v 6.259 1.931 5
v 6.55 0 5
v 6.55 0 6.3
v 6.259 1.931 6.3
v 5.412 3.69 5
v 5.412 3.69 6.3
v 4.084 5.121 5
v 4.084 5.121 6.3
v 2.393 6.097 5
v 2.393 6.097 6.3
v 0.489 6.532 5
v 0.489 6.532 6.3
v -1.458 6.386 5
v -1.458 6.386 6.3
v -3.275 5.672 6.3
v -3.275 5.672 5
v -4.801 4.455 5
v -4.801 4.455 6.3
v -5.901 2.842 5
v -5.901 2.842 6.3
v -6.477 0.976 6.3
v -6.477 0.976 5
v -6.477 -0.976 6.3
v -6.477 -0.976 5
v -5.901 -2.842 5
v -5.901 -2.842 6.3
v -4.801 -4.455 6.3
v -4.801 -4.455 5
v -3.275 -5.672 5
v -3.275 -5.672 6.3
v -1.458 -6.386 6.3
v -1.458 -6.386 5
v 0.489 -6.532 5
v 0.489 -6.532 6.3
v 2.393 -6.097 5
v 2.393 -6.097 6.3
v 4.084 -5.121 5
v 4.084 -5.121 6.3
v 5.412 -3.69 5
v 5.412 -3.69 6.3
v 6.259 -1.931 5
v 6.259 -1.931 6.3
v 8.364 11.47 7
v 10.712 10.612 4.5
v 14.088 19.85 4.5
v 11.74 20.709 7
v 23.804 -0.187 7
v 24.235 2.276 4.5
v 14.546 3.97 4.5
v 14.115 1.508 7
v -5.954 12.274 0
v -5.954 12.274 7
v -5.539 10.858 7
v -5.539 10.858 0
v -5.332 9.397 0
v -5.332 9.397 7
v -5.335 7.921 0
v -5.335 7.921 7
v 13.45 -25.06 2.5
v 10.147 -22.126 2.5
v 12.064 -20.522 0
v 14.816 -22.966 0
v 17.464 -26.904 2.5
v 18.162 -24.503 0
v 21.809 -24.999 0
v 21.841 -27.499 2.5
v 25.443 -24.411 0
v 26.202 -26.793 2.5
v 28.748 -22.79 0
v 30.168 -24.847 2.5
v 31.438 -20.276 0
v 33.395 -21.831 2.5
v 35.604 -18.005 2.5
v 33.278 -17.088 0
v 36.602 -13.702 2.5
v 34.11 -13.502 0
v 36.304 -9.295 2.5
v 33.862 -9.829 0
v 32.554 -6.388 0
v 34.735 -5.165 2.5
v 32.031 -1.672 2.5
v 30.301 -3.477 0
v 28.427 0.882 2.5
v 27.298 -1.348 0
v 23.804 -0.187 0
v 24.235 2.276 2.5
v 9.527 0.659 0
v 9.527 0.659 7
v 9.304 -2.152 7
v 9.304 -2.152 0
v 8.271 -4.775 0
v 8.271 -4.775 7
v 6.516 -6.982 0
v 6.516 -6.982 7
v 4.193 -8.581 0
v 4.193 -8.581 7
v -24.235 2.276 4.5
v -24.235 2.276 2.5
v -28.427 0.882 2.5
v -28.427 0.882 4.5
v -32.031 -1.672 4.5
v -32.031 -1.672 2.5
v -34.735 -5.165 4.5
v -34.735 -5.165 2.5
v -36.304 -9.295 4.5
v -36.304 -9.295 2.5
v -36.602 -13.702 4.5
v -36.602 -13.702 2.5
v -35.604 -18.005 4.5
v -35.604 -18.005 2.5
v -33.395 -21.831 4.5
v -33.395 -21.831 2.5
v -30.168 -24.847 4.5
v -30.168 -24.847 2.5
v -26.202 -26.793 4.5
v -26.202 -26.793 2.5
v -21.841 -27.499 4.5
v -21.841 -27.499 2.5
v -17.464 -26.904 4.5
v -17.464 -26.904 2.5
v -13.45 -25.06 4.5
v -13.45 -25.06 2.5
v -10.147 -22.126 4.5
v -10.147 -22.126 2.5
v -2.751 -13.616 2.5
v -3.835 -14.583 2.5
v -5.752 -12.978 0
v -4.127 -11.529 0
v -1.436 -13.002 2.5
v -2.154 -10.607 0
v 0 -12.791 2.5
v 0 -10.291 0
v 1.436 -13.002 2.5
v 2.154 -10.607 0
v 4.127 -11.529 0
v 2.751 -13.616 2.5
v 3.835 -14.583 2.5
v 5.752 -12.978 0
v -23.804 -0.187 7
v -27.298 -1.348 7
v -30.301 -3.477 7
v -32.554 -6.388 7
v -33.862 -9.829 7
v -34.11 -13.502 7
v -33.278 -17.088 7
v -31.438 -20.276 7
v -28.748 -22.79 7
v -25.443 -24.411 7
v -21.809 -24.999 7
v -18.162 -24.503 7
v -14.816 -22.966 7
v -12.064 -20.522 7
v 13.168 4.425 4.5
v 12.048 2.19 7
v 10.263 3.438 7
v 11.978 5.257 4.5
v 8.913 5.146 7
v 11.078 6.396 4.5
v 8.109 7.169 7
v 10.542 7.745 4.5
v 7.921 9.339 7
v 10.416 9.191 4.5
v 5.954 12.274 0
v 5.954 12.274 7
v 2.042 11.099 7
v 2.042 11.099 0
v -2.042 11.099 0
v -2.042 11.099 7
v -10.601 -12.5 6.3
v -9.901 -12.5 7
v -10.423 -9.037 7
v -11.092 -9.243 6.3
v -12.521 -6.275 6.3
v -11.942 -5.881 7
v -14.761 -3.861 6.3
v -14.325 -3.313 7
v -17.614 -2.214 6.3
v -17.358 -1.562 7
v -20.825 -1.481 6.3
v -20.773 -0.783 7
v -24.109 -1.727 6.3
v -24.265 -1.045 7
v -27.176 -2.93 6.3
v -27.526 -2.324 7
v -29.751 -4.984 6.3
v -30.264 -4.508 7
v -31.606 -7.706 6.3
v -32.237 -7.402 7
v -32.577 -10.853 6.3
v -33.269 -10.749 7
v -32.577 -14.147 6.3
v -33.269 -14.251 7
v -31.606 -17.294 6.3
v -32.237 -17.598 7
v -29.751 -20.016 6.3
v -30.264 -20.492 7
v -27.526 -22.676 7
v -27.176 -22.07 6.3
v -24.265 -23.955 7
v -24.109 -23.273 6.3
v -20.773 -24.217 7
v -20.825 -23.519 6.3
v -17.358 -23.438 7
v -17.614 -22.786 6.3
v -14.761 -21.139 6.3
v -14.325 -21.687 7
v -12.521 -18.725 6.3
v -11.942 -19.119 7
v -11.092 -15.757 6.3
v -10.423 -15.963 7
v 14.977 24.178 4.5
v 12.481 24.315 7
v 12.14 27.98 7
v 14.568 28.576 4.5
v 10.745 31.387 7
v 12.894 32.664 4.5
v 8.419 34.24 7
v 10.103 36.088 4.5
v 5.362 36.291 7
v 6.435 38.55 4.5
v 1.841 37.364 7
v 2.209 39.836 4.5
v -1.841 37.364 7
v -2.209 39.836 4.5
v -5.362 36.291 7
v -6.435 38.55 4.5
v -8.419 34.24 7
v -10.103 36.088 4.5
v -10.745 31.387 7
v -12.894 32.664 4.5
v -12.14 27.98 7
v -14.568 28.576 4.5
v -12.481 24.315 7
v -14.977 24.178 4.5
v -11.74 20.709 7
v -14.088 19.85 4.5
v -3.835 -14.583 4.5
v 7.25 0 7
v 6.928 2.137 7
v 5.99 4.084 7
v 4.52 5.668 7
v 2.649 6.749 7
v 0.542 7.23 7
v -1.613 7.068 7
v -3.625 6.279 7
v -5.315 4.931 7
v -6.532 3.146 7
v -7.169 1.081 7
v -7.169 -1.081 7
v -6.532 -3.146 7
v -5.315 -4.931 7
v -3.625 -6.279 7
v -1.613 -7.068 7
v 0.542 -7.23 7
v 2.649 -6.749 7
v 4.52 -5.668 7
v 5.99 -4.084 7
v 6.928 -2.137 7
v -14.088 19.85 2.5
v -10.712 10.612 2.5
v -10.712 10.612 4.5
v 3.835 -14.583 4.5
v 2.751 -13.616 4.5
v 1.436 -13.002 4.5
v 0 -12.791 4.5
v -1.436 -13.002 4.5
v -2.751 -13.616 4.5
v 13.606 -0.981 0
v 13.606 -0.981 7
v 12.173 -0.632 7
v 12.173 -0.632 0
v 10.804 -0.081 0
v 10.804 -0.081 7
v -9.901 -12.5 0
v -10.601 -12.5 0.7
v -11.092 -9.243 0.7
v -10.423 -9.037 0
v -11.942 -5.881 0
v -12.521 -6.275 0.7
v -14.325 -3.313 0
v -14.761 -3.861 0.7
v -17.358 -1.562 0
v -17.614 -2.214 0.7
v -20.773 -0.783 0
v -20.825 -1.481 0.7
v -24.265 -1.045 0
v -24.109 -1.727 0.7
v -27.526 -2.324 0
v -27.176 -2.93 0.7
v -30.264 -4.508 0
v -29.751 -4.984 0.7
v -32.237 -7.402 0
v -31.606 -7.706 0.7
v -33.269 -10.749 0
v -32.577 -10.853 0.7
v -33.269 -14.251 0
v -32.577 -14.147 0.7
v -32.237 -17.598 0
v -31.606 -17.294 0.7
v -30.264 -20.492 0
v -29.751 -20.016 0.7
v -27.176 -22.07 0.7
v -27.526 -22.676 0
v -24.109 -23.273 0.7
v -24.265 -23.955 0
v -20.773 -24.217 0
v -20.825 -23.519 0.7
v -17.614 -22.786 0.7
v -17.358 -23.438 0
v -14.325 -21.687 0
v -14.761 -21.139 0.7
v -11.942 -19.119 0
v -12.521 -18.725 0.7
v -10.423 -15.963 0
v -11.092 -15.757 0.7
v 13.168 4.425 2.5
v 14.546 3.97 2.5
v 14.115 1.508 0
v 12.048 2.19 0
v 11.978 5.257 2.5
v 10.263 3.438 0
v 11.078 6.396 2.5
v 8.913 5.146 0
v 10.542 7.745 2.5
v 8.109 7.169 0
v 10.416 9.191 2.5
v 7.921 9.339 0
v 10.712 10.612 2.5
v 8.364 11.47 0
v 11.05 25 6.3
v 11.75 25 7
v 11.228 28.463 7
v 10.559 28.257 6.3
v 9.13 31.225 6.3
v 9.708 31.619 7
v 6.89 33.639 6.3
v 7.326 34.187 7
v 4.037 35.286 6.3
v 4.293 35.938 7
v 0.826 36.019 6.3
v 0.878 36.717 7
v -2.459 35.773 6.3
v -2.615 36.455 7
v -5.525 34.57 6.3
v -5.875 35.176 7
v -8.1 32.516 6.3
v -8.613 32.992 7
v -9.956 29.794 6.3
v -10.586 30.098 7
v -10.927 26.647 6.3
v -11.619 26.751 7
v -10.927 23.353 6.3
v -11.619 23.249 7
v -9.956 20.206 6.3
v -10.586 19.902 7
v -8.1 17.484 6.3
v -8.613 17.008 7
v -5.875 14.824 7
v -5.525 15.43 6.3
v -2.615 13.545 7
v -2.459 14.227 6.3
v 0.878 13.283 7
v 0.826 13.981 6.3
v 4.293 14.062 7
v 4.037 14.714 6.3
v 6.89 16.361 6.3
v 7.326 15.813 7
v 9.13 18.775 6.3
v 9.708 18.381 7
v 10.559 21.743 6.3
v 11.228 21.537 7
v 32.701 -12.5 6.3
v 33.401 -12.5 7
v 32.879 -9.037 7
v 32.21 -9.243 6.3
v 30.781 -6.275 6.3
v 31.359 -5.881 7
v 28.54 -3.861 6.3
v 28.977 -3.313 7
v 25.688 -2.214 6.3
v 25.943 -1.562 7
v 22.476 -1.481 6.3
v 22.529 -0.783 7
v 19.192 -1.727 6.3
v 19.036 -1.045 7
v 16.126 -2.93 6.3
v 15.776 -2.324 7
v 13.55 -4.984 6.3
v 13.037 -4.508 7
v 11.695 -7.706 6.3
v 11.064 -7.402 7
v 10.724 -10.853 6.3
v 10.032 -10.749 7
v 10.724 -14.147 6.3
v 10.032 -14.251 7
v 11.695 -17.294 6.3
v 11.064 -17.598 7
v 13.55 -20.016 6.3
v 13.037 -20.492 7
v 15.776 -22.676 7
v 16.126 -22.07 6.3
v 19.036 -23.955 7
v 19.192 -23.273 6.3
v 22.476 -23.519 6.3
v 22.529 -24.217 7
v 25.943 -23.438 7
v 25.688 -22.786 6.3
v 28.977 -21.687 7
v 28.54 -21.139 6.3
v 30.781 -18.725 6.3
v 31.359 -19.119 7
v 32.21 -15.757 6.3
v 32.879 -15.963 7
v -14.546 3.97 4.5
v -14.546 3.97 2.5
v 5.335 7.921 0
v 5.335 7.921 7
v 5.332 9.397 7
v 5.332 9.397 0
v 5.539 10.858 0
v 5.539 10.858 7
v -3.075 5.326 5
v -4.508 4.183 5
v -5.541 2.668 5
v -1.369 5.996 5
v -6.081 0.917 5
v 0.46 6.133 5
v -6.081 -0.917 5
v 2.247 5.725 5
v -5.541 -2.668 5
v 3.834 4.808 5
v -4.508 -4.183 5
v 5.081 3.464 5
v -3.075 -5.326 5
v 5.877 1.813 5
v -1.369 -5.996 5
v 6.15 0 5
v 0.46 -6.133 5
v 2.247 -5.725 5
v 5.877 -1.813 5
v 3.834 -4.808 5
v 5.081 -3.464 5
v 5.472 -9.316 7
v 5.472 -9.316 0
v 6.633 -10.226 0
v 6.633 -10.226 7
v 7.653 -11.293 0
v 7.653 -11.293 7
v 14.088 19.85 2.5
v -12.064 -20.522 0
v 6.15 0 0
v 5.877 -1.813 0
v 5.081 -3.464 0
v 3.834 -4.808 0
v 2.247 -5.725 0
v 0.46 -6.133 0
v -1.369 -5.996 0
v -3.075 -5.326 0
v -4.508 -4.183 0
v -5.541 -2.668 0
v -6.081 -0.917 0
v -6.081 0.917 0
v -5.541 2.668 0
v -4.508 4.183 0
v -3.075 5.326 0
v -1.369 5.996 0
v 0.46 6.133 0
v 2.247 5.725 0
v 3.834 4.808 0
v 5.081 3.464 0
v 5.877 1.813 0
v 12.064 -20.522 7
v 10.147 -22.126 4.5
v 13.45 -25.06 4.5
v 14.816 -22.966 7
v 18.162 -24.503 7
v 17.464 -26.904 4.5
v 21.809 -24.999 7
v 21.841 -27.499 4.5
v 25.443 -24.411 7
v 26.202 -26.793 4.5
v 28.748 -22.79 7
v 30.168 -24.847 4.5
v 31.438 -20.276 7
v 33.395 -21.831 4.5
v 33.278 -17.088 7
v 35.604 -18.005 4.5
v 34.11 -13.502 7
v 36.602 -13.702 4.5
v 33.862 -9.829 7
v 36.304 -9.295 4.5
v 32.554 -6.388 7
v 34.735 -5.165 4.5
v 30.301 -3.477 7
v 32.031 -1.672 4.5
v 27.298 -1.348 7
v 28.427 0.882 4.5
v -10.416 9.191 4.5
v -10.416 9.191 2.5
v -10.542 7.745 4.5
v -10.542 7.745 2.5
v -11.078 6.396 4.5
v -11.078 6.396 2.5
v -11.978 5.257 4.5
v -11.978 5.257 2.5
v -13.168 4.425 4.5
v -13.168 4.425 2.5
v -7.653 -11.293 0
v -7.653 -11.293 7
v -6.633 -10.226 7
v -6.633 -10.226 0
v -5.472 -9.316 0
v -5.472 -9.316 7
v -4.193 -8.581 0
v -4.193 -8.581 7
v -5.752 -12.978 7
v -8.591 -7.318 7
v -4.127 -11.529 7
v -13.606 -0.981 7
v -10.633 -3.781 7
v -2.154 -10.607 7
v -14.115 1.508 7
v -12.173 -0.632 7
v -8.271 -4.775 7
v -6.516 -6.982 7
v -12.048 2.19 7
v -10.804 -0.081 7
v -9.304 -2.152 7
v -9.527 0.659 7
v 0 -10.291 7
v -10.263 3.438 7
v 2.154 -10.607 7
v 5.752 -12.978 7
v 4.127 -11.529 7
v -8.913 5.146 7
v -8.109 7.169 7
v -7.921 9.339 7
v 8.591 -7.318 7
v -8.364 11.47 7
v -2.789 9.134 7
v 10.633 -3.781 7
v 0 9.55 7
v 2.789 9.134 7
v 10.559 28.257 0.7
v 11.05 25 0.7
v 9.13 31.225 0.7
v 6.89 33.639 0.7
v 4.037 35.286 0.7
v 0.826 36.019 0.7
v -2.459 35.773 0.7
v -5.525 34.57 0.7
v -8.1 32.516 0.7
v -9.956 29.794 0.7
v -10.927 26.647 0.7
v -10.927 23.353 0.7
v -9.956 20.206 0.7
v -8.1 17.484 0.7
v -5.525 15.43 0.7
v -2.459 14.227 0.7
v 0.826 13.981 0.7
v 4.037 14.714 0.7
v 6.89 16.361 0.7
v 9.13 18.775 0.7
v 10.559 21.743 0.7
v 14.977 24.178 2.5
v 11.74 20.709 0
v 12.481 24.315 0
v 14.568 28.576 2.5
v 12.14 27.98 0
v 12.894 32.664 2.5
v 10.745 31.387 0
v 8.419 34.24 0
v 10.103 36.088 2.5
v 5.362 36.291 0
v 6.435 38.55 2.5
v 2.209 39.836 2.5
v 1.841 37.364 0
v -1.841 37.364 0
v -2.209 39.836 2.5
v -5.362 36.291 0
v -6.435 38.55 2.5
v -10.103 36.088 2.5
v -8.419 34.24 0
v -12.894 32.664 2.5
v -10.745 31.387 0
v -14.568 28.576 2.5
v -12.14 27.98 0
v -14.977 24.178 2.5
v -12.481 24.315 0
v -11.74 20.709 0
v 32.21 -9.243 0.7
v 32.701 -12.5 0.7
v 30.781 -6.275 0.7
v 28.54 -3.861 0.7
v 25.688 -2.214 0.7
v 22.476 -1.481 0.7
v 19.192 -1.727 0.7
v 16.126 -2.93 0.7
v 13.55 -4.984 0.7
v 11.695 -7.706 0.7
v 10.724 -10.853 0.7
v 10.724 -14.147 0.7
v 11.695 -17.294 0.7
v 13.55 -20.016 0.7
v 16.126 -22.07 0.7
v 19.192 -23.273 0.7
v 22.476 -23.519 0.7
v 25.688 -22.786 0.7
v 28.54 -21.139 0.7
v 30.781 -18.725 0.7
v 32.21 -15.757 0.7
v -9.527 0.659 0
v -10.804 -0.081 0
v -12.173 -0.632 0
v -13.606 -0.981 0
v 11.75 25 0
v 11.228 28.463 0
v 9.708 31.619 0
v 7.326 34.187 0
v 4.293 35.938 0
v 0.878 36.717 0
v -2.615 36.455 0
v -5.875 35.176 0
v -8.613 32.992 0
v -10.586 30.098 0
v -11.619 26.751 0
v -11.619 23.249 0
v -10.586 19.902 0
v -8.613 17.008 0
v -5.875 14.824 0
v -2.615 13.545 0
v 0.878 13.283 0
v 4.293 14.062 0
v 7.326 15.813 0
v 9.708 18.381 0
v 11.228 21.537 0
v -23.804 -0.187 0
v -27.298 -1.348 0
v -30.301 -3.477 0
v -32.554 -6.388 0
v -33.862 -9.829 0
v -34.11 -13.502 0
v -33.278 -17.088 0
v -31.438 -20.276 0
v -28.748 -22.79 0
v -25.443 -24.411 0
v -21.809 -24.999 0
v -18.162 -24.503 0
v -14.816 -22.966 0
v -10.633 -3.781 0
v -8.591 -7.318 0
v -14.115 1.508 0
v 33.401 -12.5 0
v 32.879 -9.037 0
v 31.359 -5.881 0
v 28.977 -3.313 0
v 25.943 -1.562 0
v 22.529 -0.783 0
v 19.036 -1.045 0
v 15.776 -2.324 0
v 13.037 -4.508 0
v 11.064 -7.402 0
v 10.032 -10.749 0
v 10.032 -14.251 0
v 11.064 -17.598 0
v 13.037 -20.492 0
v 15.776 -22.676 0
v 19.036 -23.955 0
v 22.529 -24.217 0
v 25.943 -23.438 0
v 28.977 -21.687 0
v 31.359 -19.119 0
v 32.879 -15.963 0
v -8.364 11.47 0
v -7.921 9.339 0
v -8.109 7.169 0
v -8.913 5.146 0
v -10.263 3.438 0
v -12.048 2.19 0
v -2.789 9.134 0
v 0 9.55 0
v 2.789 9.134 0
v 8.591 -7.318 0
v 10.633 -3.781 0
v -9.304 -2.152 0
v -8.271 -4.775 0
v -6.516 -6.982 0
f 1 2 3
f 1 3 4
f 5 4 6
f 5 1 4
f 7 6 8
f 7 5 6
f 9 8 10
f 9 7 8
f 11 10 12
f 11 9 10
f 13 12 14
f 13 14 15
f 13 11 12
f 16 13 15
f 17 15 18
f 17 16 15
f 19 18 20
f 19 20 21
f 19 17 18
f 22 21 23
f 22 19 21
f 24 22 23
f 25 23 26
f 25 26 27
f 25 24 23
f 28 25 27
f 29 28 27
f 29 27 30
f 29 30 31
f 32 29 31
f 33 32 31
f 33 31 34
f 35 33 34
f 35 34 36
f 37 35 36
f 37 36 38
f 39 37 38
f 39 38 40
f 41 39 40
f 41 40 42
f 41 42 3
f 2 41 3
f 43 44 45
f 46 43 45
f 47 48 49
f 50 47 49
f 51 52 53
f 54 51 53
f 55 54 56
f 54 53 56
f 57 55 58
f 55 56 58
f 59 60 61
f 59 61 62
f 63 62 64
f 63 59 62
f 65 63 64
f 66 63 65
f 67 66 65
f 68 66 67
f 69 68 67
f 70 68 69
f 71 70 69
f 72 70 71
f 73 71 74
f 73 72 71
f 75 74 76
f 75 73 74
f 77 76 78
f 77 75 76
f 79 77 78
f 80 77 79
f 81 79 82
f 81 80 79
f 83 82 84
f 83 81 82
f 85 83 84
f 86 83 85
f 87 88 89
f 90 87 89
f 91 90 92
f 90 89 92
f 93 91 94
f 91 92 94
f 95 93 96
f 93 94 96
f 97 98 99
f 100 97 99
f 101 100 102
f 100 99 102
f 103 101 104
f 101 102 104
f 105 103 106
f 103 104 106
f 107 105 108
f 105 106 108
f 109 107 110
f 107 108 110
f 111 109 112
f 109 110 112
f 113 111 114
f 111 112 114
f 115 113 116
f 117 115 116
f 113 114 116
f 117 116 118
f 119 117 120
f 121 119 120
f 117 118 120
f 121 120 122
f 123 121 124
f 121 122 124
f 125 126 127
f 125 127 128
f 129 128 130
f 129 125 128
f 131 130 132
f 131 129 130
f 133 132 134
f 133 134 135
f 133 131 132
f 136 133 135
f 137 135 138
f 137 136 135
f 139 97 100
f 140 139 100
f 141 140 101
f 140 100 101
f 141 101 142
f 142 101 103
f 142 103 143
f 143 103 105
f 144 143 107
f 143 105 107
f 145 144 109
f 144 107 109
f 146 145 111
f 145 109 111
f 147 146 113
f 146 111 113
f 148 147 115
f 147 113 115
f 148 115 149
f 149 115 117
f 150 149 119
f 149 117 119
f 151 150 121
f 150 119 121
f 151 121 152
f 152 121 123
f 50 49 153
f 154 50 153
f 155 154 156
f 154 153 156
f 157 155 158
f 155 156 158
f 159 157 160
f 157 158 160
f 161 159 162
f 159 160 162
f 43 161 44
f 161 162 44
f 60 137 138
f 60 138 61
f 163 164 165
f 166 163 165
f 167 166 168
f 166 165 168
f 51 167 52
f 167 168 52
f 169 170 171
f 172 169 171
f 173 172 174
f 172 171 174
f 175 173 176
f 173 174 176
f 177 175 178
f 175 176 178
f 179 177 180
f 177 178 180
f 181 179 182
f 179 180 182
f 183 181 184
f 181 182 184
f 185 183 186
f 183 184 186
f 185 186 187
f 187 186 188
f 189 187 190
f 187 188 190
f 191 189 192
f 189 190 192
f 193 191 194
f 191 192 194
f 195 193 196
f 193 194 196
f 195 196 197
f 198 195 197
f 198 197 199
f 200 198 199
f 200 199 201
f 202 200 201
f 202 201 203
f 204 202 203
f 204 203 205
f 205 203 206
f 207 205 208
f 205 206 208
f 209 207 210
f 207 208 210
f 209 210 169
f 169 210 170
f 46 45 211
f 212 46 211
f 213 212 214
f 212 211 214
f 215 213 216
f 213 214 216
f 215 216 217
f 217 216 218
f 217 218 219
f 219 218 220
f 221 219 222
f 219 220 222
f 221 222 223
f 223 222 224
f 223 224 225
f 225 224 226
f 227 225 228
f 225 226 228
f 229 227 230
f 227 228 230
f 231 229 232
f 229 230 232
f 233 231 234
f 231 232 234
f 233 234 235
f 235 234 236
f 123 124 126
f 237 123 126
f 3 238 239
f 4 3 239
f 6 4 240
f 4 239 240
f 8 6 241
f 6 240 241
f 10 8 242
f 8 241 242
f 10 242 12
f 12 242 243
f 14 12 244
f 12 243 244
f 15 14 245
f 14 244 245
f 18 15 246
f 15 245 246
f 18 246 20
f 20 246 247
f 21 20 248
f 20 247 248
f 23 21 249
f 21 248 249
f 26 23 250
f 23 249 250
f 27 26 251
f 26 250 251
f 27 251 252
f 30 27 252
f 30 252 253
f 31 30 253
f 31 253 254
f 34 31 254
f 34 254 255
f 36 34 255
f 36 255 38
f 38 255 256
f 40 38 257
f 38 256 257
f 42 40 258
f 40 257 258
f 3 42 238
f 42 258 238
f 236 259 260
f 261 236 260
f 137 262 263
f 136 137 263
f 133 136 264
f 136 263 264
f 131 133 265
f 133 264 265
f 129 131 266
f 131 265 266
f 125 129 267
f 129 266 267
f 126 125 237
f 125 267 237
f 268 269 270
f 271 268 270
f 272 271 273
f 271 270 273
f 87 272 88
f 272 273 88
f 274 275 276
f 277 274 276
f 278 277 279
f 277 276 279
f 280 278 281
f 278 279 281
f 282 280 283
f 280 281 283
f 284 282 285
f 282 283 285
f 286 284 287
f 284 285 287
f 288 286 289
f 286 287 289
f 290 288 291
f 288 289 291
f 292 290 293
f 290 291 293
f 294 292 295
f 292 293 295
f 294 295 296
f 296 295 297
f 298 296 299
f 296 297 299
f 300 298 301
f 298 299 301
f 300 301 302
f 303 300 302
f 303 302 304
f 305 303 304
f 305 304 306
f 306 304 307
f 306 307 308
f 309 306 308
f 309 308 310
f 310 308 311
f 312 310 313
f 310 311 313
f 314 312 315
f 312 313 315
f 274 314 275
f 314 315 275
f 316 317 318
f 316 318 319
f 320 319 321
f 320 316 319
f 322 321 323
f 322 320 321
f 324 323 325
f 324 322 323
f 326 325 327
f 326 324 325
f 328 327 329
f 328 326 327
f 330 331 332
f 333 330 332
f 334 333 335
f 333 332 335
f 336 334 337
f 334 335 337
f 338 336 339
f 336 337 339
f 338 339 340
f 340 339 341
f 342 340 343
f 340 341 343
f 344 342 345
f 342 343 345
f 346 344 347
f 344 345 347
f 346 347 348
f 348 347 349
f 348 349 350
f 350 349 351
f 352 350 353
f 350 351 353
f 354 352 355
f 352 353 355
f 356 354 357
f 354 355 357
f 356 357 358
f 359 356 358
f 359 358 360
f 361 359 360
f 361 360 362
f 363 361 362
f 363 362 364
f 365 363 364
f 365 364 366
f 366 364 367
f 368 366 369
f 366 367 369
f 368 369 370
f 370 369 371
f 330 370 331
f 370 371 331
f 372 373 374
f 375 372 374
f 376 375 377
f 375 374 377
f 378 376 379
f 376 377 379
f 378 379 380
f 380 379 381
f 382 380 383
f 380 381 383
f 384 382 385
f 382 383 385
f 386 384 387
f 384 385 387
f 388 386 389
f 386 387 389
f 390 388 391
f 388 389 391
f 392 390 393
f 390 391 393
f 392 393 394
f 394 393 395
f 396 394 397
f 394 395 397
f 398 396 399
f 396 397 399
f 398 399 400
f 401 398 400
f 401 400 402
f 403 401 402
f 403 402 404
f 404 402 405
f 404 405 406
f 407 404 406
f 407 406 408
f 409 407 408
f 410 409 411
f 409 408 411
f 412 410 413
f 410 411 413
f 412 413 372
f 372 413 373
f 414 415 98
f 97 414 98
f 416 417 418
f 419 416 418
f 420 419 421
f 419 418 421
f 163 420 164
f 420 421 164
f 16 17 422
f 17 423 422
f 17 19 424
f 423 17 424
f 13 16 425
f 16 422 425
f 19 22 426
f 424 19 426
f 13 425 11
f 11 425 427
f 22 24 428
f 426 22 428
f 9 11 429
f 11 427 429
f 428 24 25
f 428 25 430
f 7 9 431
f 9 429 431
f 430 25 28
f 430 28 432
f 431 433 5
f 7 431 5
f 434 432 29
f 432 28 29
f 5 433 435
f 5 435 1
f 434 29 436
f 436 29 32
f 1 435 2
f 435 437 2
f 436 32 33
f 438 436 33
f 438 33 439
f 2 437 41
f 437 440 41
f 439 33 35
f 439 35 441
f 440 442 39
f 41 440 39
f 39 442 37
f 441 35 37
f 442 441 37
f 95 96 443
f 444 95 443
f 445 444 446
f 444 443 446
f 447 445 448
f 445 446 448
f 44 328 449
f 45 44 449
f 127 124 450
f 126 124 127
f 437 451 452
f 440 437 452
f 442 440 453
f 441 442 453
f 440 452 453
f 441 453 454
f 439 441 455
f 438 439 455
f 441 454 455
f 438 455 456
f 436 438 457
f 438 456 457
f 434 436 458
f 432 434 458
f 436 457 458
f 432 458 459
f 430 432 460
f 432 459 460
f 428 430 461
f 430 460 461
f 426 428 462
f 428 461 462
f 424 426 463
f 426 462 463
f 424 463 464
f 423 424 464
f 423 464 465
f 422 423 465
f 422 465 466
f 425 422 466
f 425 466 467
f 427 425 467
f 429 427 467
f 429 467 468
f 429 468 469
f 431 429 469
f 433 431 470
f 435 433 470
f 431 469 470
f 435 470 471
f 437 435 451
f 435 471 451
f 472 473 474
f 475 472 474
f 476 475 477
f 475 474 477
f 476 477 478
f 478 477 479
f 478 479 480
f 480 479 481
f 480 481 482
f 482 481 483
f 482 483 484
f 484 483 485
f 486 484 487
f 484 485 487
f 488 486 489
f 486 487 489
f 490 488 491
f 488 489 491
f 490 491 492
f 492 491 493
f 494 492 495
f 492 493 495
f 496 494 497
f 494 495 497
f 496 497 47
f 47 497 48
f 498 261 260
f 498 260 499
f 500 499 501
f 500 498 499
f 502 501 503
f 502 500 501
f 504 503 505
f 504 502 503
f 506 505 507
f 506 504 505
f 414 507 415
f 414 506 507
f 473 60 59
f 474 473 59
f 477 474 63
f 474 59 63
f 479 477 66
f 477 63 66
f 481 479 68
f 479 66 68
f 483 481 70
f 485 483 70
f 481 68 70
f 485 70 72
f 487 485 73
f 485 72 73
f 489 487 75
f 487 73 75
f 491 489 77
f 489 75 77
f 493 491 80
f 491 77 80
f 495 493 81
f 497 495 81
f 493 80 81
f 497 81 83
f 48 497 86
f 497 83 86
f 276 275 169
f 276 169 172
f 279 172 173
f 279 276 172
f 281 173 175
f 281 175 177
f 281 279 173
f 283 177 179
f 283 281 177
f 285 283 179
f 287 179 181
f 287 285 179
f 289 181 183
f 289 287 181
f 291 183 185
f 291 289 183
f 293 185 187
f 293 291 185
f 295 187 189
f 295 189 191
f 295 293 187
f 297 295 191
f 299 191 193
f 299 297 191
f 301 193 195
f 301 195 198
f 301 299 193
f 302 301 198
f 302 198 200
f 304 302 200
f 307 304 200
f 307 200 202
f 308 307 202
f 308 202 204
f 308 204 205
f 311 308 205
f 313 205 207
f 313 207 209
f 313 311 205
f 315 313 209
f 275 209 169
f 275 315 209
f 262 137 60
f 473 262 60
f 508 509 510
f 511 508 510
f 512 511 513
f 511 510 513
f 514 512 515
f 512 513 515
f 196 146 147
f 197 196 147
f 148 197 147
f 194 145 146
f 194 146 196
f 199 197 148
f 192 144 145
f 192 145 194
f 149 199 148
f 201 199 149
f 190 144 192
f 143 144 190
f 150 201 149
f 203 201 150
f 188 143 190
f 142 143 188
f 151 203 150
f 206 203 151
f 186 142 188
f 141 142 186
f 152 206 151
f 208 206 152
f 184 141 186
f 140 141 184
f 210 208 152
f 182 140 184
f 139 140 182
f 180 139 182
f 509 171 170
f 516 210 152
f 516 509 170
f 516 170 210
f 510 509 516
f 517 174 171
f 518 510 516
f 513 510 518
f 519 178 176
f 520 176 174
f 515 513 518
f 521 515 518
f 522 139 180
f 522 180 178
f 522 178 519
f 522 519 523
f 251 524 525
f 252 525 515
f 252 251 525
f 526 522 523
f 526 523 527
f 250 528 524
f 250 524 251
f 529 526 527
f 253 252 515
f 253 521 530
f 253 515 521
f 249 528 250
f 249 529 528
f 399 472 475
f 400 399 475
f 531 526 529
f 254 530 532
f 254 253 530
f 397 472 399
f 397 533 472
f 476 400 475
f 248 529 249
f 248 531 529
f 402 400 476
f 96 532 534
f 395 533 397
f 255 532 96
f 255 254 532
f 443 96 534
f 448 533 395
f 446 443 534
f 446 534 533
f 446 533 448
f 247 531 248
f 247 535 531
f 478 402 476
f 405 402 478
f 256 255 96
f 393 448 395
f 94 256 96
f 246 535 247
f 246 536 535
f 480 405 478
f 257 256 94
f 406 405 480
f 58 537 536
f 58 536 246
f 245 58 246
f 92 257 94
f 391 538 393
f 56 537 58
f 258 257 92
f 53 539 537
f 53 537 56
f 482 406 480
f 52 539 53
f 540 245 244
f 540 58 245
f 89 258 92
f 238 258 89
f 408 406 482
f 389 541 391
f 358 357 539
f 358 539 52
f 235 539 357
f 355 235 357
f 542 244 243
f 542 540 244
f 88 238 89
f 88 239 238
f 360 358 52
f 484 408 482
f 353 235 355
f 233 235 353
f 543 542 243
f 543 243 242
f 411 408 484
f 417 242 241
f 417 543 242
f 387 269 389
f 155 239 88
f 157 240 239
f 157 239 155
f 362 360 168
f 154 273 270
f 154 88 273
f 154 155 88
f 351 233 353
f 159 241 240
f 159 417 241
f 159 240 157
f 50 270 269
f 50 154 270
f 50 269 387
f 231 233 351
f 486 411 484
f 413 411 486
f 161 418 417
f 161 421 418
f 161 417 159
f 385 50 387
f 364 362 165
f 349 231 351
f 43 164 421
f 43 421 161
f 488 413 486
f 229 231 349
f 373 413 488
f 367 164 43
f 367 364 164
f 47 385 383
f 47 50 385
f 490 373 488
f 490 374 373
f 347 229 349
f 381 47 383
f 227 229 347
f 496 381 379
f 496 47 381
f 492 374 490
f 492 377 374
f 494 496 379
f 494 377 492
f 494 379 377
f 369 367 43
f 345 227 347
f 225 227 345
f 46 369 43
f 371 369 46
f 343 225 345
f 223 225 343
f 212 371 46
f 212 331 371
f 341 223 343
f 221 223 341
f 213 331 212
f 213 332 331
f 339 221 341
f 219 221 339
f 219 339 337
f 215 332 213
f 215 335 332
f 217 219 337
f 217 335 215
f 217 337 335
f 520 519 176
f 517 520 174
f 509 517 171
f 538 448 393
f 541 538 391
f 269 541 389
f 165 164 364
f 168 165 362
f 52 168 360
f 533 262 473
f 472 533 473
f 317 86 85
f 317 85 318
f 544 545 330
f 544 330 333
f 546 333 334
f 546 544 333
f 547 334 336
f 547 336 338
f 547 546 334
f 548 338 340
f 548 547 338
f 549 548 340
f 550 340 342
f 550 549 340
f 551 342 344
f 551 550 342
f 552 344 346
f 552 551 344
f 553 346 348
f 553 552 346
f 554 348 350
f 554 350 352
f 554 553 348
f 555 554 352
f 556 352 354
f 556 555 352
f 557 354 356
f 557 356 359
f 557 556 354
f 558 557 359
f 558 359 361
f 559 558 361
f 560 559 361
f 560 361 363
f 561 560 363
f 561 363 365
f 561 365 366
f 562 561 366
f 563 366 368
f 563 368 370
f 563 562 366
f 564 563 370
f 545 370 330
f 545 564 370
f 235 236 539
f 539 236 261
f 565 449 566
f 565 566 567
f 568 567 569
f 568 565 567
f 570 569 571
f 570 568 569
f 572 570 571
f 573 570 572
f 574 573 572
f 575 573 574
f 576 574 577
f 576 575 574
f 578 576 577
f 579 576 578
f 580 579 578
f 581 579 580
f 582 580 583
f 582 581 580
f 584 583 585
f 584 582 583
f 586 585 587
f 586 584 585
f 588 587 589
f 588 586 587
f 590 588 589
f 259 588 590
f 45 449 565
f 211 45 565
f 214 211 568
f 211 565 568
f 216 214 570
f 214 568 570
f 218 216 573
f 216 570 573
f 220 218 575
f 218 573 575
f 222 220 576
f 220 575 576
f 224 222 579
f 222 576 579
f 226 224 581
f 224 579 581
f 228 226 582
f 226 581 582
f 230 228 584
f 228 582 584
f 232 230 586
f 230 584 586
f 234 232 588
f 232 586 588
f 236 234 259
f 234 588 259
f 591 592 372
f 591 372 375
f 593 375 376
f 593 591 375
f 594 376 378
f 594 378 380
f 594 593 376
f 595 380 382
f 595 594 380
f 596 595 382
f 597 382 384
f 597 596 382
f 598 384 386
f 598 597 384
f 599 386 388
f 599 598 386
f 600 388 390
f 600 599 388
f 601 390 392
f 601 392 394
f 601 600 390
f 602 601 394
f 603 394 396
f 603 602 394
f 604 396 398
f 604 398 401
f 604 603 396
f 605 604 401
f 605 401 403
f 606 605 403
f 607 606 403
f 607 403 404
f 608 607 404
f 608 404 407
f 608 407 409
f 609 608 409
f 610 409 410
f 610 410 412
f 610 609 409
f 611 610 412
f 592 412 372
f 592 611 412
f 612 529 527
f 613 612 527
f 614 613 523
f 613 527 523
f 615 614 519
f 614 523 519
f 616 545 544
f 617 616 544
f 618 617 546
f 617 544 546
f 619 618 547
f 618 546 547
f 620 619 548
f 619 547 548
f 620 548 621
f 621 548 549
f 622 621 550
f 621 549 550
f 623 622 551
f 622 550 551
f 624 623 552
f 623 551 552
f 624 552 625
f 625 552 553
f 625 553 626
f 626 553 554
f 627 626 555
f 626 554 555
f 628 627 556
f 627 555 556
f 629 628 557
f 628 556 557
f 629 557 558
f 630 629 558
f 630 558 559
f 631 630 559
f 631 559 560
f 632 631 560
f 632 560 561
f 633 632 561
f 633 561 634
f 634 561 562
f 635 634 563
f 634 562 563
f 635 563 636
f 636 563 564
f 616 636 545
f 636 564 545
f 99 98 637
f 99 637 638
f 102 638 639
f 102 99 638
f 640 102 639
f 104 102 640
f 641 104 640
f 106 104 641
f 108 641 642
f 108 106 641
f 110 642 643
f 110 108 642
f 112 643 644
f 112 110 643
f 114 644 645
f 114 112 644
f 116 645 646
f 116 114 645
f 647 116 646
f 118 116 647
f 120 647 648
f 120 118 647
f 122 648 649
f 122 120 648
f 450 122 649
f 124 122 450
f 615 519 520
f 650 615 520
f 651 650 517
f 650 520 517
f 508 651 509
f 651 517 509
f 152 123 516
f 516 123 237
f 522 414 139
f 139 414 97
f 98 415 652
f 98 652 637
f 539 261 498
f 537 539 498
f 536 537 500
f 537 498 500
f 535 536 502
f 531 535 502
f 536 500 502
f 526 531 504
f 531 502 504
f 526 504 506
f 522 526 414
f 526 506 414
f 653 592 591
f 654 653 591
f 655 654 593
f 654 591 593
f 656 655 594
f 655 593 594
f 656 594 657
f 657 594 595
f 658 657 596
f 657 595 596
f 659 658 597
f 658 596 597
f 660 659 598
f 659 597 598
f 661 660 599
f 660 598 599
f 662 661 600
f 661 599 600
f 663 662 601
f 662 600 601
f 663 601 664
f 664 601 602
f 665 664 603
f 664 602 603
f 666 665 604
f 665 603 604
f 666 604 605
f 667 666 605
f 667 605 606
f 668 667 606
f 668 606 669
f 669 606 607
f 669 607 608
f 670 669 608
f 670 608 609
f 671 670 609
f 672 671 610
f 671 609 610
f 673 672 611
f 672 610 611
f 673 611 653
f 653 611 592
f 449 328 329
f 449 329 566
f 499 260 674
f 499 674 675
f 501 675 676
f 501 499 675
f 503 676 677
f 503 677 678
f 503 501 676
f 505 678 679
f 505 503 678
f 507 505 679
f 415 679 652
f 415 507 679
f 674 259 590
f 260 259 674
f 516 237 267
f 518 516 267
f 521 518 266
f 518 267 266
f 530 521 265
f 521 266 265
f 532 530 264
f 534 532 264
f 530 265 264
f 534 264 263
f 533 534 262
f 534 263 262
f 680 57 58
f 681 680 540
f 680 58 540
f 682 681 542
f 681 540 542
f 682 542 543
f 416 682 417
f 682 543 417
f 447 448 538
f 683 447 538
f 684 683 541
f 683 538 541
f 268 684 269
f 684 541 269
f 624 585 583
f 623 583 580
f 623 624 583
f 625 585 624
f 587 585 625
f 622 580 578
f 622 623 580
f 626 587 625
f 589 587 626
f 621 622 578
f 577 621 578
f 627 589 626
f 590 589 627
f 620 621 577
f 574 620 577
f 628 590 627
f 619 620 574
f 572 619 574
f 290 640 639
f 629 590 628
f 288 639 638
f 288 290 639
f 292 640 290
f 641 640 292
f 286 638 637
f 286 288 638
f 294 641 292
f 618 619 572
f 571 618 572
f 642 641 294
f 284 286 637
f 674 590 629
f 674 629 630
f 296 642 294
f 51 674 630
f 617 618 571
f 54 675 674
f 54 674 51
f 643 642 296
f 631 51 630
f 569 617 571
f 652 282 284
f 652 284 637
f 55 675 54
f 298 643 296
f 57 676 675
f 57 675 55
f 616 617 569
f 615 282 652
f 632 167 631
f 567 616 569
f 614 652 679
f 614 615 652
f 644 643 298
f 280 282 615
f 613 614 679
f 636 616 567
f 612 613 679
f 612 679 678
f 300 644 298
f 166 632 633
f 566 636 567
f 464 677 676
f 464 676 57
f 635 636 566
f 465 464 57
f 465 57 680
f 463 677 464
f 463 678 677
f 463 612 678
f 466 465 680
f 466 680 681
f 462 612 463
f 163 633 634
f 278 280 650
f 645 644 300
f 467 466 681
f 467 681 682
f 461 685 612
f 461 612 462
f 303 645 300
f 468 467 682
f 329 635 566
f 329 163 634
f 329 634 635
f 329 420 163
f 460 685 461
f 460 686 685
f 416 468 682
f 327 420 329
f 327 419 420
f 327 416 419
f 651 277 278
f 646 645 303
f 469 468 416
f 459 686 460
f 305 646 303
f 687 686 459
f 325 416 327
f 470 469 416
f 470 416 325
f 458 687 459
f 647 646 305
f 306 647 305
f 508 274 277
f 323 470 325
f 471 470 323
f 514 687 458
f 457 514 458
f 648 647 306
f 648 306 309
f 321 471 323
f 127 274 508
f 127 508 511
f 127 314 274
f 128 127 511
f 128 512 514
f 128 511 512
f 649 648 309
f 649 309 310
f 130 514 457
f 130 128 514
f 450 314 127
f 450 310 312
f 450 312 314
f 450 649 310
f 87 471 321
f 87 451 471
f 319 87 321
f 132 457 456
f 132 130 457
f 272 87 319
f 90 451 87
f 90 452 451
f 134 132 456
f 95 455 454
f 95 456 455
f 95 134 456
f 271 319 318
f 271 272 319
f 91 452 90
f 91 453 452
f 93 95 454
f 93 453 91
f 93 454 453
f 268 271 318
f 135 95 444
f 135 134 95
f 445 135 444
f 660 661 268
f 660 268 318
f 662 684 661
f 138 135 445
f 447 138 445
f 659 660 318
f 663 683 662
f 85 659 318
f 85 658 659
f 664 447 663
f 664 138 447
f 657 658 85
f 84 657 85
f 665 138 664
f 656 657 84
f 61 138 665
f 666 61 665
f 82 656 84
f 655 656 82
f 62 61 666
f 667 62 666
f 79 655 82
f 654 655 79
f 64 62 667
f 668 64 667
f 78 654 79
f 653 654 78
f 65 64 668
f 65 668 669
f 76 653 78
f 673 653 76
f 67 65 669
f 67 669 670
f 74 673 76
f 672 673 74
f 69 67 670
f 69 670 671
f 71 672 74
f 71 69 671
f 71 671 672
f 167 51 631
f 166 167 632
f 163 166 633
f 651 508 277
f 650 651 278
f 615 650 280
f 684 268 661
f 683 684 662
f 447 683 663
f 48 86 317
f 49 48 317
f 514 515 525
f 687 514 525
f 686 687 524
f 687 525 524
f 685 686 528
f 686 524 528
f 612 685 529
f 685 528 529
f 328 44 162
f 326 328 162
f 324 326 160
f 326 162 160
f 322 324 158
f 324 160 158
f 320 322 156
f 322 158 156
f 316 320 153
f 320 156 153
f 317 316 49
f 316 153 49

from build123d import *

# Parameters (mm, degrees)
F0_R     = 11.05
F0_R_2   = 6.55
F1_DEPTH = 7
F2_R     = 5
F3_SIZE  = 2.5
F4_R     = 6.55
F4_R_2   = 6.15
F5_DEPTH = 5
F6_SIZE  = 0.7
F8_DEPTH = 25


with BuildPart() as f1:
    # F0 (on Top) → F1 (new body)
    with BuildSketch(Plane.XY):
        with BuildLine():
            Line((8.6602540378, 5), (14.0883655764, 19.8504412435))
            ThreePointArc((14.0883655764, 19.8504412435), (0, 40), (-14.0883655764, 19.8504412435))
            Line((-14.0883655764, 19.8504412435), (-8.6602540378, 5))
            Line((-8.6602540378, 5), (-24.2351691813, 2.2756618652))
            ThreePointArc((-24.2351691813, 2.2756618652), (-34.6410161514, -20), (-10.146803605, -22.1261031087))
            Line((-10.146803605, -22.1261031087), (0, -10))
            Line((0, -10), (10.146803605, -22.1261031087))
            ThreePointArc((10.146803605, -22.1261031087), (34.6410161514, -20), (24.2351691813, 2.2756618652))
            Line((24.2351691813, 2.2756618652), (8.6602540378, 5))
        make_face()
        with Locations((-21.6506350946, -12.5)):
            Circle(F0_R, mode=Mode.SUBTRACT)
        with Locations((21.6506350946, -12.5)):
            Circle(F0_R, mode=Mode.SUBTRACT)
        Circle(F0_R_2, mode=Mode.SUBTRACT)
        with Locations((0, 25)):
            Circle(F0_R, mode=Mode.SUBTRACT)
    extrude(amount=F1_DEPTH)

    # F2
    f2_edges = [f1.edges().sort_by_distance(p)[0] for p in [
        (0, -10, 3.5),
        (8.660254, 5, 3.5),
        (-8.660254, 5, 3.5),
    ]]
    fillet(f2_edges, radius=F2_R)

    # F3
    f3_edges = [f1.edges().sort_by_distance(p)[0] for p in [
        (-19.390694, 3.123049, 7),
        (-6.990707, -18.354358, 0),
        (12.399987, 15.231309, 0),
        (12.399987, 15.231309, 7),
        (11.077604, 6.395657, 0),
        (0, 40, 0),
        (19.390694, 3.123049, 0),
        (-12.399987, 15.231309, 0),
        (34.641016, -20, 0),
        (-11.077604, 6.395657, 0),
        (6.990707, -18.354358, 0),
        (-19.390694, 3.123049, 0),
        (0, -12.791315, 0),
        (-34.641016, -20, 0),
        (11.077604, 6.395657, 7),
        (0, 40, 7),
        (19.390694, 3.123049, 7),
        (-12.399987, 15.231309, 7),
        (34.641016, -20, 7),
        (-11.077604, 6.395657, 7),
        (6.990707, -18.354358, 7),
        (0, -12.791315, 7),
        (-34.641016, -20, 7),
        (-6.990707, -18.354358, 7),
    ]]
    chamfer(f3_edges, length=F3_SIZE)

    # F4 (on face) → F5 (join)
    with BuildSketch(Plane(origin=(0, 0, 0), x_dir=(1, 0, 0), z_dir=(0, 0, -1))):
        Circle(F4_R)
        Circle(F4_R_2, mode=Mode.SUBTRACT)
    extrude(amount=-F5_DEPTH)

    # F6
    f6_edges = [f1.edges().sort_by_distance(p)[0] for p in [
        (-6.55, 0, 7),
        (-32.700635, -12.5, 7),
        (10.600635, -12.5, 7),
        (-11.05, 25, 7),
        (-32.700635, -12.5, 0),
        (10.600635, -12.5, 0),
        (-11.05, 25, 0),
    ]]
    chamfer(f6_edges, length=F6_SIZE)

    # F7 (on face) → F8 (cut)
    with BuildSketch(Plane.XY.offset(7)):
        with BuildLine():
            ThreePointArc((-4.1925255318, -8.5805145338), (-8.2705426061, -4.775), (-9.5272063297, 0.6594236504))
            ThreePointArc((-9.5272063297, 0.6594236504), (-11.4782376336, -0.3808245165), (-13.6062935442, -0.9808390488))
            ThreePointArc((-13.6062935442, -0.9808390488), (-9.4829781714, -5.475), (-7.6525783054, -11.2929763362))
            ThreePointArc((-7.6525783054, -11.2929763362), (-6.0689225225, -9.7500331232), (-4.1925255318, -8.5805145338))
        make_face()
        with BuildLine():
            ThreePointArc((-5.3346807979, 7.9210908835), (0, 9.55), (5.3346807979, 7.9210908835))
            ThreePointArc((5.3346807979, 7.9210908835), (5.4093151112, 10.1308576396), (5.9537152388, 12.273815385))
            ThreePointArc((5.9537152388, 12.273815385), (0, 10.95), (-5.9537152388, 12.273815385))
            ThreePointArc((-5.9537152388, 12.273815385), (-5.4093151112, 10.1308576396), (-5.3346807979, 7.9210908835))
        make_face()
        with BuildLine():
            ThreePointArc((9.5272063297, 0.6594236504), (8.2705426061, -4.775), (4.1925255318, -8.5805145338))
            ThreePointArc((4.1925255318, -8.5805145338), (6.0689225225, -9.7500331232), (7.6525783054, -11.2929763362))
            ThreePointArc((7.6525783054, -11.2929763362), (9.4829781714, -5.475), (13.6062935442, -0.9808390488))
            ThreePointArc((13.6062935442, -0.9808390488), (11.4782376336, -0.3808245165), (9.5272063297, 0.6594236504))
        make_face()
    extrude(amount=-F8_DEPTH, mode=Mode.SUBTRACT)


solid = f1.part
